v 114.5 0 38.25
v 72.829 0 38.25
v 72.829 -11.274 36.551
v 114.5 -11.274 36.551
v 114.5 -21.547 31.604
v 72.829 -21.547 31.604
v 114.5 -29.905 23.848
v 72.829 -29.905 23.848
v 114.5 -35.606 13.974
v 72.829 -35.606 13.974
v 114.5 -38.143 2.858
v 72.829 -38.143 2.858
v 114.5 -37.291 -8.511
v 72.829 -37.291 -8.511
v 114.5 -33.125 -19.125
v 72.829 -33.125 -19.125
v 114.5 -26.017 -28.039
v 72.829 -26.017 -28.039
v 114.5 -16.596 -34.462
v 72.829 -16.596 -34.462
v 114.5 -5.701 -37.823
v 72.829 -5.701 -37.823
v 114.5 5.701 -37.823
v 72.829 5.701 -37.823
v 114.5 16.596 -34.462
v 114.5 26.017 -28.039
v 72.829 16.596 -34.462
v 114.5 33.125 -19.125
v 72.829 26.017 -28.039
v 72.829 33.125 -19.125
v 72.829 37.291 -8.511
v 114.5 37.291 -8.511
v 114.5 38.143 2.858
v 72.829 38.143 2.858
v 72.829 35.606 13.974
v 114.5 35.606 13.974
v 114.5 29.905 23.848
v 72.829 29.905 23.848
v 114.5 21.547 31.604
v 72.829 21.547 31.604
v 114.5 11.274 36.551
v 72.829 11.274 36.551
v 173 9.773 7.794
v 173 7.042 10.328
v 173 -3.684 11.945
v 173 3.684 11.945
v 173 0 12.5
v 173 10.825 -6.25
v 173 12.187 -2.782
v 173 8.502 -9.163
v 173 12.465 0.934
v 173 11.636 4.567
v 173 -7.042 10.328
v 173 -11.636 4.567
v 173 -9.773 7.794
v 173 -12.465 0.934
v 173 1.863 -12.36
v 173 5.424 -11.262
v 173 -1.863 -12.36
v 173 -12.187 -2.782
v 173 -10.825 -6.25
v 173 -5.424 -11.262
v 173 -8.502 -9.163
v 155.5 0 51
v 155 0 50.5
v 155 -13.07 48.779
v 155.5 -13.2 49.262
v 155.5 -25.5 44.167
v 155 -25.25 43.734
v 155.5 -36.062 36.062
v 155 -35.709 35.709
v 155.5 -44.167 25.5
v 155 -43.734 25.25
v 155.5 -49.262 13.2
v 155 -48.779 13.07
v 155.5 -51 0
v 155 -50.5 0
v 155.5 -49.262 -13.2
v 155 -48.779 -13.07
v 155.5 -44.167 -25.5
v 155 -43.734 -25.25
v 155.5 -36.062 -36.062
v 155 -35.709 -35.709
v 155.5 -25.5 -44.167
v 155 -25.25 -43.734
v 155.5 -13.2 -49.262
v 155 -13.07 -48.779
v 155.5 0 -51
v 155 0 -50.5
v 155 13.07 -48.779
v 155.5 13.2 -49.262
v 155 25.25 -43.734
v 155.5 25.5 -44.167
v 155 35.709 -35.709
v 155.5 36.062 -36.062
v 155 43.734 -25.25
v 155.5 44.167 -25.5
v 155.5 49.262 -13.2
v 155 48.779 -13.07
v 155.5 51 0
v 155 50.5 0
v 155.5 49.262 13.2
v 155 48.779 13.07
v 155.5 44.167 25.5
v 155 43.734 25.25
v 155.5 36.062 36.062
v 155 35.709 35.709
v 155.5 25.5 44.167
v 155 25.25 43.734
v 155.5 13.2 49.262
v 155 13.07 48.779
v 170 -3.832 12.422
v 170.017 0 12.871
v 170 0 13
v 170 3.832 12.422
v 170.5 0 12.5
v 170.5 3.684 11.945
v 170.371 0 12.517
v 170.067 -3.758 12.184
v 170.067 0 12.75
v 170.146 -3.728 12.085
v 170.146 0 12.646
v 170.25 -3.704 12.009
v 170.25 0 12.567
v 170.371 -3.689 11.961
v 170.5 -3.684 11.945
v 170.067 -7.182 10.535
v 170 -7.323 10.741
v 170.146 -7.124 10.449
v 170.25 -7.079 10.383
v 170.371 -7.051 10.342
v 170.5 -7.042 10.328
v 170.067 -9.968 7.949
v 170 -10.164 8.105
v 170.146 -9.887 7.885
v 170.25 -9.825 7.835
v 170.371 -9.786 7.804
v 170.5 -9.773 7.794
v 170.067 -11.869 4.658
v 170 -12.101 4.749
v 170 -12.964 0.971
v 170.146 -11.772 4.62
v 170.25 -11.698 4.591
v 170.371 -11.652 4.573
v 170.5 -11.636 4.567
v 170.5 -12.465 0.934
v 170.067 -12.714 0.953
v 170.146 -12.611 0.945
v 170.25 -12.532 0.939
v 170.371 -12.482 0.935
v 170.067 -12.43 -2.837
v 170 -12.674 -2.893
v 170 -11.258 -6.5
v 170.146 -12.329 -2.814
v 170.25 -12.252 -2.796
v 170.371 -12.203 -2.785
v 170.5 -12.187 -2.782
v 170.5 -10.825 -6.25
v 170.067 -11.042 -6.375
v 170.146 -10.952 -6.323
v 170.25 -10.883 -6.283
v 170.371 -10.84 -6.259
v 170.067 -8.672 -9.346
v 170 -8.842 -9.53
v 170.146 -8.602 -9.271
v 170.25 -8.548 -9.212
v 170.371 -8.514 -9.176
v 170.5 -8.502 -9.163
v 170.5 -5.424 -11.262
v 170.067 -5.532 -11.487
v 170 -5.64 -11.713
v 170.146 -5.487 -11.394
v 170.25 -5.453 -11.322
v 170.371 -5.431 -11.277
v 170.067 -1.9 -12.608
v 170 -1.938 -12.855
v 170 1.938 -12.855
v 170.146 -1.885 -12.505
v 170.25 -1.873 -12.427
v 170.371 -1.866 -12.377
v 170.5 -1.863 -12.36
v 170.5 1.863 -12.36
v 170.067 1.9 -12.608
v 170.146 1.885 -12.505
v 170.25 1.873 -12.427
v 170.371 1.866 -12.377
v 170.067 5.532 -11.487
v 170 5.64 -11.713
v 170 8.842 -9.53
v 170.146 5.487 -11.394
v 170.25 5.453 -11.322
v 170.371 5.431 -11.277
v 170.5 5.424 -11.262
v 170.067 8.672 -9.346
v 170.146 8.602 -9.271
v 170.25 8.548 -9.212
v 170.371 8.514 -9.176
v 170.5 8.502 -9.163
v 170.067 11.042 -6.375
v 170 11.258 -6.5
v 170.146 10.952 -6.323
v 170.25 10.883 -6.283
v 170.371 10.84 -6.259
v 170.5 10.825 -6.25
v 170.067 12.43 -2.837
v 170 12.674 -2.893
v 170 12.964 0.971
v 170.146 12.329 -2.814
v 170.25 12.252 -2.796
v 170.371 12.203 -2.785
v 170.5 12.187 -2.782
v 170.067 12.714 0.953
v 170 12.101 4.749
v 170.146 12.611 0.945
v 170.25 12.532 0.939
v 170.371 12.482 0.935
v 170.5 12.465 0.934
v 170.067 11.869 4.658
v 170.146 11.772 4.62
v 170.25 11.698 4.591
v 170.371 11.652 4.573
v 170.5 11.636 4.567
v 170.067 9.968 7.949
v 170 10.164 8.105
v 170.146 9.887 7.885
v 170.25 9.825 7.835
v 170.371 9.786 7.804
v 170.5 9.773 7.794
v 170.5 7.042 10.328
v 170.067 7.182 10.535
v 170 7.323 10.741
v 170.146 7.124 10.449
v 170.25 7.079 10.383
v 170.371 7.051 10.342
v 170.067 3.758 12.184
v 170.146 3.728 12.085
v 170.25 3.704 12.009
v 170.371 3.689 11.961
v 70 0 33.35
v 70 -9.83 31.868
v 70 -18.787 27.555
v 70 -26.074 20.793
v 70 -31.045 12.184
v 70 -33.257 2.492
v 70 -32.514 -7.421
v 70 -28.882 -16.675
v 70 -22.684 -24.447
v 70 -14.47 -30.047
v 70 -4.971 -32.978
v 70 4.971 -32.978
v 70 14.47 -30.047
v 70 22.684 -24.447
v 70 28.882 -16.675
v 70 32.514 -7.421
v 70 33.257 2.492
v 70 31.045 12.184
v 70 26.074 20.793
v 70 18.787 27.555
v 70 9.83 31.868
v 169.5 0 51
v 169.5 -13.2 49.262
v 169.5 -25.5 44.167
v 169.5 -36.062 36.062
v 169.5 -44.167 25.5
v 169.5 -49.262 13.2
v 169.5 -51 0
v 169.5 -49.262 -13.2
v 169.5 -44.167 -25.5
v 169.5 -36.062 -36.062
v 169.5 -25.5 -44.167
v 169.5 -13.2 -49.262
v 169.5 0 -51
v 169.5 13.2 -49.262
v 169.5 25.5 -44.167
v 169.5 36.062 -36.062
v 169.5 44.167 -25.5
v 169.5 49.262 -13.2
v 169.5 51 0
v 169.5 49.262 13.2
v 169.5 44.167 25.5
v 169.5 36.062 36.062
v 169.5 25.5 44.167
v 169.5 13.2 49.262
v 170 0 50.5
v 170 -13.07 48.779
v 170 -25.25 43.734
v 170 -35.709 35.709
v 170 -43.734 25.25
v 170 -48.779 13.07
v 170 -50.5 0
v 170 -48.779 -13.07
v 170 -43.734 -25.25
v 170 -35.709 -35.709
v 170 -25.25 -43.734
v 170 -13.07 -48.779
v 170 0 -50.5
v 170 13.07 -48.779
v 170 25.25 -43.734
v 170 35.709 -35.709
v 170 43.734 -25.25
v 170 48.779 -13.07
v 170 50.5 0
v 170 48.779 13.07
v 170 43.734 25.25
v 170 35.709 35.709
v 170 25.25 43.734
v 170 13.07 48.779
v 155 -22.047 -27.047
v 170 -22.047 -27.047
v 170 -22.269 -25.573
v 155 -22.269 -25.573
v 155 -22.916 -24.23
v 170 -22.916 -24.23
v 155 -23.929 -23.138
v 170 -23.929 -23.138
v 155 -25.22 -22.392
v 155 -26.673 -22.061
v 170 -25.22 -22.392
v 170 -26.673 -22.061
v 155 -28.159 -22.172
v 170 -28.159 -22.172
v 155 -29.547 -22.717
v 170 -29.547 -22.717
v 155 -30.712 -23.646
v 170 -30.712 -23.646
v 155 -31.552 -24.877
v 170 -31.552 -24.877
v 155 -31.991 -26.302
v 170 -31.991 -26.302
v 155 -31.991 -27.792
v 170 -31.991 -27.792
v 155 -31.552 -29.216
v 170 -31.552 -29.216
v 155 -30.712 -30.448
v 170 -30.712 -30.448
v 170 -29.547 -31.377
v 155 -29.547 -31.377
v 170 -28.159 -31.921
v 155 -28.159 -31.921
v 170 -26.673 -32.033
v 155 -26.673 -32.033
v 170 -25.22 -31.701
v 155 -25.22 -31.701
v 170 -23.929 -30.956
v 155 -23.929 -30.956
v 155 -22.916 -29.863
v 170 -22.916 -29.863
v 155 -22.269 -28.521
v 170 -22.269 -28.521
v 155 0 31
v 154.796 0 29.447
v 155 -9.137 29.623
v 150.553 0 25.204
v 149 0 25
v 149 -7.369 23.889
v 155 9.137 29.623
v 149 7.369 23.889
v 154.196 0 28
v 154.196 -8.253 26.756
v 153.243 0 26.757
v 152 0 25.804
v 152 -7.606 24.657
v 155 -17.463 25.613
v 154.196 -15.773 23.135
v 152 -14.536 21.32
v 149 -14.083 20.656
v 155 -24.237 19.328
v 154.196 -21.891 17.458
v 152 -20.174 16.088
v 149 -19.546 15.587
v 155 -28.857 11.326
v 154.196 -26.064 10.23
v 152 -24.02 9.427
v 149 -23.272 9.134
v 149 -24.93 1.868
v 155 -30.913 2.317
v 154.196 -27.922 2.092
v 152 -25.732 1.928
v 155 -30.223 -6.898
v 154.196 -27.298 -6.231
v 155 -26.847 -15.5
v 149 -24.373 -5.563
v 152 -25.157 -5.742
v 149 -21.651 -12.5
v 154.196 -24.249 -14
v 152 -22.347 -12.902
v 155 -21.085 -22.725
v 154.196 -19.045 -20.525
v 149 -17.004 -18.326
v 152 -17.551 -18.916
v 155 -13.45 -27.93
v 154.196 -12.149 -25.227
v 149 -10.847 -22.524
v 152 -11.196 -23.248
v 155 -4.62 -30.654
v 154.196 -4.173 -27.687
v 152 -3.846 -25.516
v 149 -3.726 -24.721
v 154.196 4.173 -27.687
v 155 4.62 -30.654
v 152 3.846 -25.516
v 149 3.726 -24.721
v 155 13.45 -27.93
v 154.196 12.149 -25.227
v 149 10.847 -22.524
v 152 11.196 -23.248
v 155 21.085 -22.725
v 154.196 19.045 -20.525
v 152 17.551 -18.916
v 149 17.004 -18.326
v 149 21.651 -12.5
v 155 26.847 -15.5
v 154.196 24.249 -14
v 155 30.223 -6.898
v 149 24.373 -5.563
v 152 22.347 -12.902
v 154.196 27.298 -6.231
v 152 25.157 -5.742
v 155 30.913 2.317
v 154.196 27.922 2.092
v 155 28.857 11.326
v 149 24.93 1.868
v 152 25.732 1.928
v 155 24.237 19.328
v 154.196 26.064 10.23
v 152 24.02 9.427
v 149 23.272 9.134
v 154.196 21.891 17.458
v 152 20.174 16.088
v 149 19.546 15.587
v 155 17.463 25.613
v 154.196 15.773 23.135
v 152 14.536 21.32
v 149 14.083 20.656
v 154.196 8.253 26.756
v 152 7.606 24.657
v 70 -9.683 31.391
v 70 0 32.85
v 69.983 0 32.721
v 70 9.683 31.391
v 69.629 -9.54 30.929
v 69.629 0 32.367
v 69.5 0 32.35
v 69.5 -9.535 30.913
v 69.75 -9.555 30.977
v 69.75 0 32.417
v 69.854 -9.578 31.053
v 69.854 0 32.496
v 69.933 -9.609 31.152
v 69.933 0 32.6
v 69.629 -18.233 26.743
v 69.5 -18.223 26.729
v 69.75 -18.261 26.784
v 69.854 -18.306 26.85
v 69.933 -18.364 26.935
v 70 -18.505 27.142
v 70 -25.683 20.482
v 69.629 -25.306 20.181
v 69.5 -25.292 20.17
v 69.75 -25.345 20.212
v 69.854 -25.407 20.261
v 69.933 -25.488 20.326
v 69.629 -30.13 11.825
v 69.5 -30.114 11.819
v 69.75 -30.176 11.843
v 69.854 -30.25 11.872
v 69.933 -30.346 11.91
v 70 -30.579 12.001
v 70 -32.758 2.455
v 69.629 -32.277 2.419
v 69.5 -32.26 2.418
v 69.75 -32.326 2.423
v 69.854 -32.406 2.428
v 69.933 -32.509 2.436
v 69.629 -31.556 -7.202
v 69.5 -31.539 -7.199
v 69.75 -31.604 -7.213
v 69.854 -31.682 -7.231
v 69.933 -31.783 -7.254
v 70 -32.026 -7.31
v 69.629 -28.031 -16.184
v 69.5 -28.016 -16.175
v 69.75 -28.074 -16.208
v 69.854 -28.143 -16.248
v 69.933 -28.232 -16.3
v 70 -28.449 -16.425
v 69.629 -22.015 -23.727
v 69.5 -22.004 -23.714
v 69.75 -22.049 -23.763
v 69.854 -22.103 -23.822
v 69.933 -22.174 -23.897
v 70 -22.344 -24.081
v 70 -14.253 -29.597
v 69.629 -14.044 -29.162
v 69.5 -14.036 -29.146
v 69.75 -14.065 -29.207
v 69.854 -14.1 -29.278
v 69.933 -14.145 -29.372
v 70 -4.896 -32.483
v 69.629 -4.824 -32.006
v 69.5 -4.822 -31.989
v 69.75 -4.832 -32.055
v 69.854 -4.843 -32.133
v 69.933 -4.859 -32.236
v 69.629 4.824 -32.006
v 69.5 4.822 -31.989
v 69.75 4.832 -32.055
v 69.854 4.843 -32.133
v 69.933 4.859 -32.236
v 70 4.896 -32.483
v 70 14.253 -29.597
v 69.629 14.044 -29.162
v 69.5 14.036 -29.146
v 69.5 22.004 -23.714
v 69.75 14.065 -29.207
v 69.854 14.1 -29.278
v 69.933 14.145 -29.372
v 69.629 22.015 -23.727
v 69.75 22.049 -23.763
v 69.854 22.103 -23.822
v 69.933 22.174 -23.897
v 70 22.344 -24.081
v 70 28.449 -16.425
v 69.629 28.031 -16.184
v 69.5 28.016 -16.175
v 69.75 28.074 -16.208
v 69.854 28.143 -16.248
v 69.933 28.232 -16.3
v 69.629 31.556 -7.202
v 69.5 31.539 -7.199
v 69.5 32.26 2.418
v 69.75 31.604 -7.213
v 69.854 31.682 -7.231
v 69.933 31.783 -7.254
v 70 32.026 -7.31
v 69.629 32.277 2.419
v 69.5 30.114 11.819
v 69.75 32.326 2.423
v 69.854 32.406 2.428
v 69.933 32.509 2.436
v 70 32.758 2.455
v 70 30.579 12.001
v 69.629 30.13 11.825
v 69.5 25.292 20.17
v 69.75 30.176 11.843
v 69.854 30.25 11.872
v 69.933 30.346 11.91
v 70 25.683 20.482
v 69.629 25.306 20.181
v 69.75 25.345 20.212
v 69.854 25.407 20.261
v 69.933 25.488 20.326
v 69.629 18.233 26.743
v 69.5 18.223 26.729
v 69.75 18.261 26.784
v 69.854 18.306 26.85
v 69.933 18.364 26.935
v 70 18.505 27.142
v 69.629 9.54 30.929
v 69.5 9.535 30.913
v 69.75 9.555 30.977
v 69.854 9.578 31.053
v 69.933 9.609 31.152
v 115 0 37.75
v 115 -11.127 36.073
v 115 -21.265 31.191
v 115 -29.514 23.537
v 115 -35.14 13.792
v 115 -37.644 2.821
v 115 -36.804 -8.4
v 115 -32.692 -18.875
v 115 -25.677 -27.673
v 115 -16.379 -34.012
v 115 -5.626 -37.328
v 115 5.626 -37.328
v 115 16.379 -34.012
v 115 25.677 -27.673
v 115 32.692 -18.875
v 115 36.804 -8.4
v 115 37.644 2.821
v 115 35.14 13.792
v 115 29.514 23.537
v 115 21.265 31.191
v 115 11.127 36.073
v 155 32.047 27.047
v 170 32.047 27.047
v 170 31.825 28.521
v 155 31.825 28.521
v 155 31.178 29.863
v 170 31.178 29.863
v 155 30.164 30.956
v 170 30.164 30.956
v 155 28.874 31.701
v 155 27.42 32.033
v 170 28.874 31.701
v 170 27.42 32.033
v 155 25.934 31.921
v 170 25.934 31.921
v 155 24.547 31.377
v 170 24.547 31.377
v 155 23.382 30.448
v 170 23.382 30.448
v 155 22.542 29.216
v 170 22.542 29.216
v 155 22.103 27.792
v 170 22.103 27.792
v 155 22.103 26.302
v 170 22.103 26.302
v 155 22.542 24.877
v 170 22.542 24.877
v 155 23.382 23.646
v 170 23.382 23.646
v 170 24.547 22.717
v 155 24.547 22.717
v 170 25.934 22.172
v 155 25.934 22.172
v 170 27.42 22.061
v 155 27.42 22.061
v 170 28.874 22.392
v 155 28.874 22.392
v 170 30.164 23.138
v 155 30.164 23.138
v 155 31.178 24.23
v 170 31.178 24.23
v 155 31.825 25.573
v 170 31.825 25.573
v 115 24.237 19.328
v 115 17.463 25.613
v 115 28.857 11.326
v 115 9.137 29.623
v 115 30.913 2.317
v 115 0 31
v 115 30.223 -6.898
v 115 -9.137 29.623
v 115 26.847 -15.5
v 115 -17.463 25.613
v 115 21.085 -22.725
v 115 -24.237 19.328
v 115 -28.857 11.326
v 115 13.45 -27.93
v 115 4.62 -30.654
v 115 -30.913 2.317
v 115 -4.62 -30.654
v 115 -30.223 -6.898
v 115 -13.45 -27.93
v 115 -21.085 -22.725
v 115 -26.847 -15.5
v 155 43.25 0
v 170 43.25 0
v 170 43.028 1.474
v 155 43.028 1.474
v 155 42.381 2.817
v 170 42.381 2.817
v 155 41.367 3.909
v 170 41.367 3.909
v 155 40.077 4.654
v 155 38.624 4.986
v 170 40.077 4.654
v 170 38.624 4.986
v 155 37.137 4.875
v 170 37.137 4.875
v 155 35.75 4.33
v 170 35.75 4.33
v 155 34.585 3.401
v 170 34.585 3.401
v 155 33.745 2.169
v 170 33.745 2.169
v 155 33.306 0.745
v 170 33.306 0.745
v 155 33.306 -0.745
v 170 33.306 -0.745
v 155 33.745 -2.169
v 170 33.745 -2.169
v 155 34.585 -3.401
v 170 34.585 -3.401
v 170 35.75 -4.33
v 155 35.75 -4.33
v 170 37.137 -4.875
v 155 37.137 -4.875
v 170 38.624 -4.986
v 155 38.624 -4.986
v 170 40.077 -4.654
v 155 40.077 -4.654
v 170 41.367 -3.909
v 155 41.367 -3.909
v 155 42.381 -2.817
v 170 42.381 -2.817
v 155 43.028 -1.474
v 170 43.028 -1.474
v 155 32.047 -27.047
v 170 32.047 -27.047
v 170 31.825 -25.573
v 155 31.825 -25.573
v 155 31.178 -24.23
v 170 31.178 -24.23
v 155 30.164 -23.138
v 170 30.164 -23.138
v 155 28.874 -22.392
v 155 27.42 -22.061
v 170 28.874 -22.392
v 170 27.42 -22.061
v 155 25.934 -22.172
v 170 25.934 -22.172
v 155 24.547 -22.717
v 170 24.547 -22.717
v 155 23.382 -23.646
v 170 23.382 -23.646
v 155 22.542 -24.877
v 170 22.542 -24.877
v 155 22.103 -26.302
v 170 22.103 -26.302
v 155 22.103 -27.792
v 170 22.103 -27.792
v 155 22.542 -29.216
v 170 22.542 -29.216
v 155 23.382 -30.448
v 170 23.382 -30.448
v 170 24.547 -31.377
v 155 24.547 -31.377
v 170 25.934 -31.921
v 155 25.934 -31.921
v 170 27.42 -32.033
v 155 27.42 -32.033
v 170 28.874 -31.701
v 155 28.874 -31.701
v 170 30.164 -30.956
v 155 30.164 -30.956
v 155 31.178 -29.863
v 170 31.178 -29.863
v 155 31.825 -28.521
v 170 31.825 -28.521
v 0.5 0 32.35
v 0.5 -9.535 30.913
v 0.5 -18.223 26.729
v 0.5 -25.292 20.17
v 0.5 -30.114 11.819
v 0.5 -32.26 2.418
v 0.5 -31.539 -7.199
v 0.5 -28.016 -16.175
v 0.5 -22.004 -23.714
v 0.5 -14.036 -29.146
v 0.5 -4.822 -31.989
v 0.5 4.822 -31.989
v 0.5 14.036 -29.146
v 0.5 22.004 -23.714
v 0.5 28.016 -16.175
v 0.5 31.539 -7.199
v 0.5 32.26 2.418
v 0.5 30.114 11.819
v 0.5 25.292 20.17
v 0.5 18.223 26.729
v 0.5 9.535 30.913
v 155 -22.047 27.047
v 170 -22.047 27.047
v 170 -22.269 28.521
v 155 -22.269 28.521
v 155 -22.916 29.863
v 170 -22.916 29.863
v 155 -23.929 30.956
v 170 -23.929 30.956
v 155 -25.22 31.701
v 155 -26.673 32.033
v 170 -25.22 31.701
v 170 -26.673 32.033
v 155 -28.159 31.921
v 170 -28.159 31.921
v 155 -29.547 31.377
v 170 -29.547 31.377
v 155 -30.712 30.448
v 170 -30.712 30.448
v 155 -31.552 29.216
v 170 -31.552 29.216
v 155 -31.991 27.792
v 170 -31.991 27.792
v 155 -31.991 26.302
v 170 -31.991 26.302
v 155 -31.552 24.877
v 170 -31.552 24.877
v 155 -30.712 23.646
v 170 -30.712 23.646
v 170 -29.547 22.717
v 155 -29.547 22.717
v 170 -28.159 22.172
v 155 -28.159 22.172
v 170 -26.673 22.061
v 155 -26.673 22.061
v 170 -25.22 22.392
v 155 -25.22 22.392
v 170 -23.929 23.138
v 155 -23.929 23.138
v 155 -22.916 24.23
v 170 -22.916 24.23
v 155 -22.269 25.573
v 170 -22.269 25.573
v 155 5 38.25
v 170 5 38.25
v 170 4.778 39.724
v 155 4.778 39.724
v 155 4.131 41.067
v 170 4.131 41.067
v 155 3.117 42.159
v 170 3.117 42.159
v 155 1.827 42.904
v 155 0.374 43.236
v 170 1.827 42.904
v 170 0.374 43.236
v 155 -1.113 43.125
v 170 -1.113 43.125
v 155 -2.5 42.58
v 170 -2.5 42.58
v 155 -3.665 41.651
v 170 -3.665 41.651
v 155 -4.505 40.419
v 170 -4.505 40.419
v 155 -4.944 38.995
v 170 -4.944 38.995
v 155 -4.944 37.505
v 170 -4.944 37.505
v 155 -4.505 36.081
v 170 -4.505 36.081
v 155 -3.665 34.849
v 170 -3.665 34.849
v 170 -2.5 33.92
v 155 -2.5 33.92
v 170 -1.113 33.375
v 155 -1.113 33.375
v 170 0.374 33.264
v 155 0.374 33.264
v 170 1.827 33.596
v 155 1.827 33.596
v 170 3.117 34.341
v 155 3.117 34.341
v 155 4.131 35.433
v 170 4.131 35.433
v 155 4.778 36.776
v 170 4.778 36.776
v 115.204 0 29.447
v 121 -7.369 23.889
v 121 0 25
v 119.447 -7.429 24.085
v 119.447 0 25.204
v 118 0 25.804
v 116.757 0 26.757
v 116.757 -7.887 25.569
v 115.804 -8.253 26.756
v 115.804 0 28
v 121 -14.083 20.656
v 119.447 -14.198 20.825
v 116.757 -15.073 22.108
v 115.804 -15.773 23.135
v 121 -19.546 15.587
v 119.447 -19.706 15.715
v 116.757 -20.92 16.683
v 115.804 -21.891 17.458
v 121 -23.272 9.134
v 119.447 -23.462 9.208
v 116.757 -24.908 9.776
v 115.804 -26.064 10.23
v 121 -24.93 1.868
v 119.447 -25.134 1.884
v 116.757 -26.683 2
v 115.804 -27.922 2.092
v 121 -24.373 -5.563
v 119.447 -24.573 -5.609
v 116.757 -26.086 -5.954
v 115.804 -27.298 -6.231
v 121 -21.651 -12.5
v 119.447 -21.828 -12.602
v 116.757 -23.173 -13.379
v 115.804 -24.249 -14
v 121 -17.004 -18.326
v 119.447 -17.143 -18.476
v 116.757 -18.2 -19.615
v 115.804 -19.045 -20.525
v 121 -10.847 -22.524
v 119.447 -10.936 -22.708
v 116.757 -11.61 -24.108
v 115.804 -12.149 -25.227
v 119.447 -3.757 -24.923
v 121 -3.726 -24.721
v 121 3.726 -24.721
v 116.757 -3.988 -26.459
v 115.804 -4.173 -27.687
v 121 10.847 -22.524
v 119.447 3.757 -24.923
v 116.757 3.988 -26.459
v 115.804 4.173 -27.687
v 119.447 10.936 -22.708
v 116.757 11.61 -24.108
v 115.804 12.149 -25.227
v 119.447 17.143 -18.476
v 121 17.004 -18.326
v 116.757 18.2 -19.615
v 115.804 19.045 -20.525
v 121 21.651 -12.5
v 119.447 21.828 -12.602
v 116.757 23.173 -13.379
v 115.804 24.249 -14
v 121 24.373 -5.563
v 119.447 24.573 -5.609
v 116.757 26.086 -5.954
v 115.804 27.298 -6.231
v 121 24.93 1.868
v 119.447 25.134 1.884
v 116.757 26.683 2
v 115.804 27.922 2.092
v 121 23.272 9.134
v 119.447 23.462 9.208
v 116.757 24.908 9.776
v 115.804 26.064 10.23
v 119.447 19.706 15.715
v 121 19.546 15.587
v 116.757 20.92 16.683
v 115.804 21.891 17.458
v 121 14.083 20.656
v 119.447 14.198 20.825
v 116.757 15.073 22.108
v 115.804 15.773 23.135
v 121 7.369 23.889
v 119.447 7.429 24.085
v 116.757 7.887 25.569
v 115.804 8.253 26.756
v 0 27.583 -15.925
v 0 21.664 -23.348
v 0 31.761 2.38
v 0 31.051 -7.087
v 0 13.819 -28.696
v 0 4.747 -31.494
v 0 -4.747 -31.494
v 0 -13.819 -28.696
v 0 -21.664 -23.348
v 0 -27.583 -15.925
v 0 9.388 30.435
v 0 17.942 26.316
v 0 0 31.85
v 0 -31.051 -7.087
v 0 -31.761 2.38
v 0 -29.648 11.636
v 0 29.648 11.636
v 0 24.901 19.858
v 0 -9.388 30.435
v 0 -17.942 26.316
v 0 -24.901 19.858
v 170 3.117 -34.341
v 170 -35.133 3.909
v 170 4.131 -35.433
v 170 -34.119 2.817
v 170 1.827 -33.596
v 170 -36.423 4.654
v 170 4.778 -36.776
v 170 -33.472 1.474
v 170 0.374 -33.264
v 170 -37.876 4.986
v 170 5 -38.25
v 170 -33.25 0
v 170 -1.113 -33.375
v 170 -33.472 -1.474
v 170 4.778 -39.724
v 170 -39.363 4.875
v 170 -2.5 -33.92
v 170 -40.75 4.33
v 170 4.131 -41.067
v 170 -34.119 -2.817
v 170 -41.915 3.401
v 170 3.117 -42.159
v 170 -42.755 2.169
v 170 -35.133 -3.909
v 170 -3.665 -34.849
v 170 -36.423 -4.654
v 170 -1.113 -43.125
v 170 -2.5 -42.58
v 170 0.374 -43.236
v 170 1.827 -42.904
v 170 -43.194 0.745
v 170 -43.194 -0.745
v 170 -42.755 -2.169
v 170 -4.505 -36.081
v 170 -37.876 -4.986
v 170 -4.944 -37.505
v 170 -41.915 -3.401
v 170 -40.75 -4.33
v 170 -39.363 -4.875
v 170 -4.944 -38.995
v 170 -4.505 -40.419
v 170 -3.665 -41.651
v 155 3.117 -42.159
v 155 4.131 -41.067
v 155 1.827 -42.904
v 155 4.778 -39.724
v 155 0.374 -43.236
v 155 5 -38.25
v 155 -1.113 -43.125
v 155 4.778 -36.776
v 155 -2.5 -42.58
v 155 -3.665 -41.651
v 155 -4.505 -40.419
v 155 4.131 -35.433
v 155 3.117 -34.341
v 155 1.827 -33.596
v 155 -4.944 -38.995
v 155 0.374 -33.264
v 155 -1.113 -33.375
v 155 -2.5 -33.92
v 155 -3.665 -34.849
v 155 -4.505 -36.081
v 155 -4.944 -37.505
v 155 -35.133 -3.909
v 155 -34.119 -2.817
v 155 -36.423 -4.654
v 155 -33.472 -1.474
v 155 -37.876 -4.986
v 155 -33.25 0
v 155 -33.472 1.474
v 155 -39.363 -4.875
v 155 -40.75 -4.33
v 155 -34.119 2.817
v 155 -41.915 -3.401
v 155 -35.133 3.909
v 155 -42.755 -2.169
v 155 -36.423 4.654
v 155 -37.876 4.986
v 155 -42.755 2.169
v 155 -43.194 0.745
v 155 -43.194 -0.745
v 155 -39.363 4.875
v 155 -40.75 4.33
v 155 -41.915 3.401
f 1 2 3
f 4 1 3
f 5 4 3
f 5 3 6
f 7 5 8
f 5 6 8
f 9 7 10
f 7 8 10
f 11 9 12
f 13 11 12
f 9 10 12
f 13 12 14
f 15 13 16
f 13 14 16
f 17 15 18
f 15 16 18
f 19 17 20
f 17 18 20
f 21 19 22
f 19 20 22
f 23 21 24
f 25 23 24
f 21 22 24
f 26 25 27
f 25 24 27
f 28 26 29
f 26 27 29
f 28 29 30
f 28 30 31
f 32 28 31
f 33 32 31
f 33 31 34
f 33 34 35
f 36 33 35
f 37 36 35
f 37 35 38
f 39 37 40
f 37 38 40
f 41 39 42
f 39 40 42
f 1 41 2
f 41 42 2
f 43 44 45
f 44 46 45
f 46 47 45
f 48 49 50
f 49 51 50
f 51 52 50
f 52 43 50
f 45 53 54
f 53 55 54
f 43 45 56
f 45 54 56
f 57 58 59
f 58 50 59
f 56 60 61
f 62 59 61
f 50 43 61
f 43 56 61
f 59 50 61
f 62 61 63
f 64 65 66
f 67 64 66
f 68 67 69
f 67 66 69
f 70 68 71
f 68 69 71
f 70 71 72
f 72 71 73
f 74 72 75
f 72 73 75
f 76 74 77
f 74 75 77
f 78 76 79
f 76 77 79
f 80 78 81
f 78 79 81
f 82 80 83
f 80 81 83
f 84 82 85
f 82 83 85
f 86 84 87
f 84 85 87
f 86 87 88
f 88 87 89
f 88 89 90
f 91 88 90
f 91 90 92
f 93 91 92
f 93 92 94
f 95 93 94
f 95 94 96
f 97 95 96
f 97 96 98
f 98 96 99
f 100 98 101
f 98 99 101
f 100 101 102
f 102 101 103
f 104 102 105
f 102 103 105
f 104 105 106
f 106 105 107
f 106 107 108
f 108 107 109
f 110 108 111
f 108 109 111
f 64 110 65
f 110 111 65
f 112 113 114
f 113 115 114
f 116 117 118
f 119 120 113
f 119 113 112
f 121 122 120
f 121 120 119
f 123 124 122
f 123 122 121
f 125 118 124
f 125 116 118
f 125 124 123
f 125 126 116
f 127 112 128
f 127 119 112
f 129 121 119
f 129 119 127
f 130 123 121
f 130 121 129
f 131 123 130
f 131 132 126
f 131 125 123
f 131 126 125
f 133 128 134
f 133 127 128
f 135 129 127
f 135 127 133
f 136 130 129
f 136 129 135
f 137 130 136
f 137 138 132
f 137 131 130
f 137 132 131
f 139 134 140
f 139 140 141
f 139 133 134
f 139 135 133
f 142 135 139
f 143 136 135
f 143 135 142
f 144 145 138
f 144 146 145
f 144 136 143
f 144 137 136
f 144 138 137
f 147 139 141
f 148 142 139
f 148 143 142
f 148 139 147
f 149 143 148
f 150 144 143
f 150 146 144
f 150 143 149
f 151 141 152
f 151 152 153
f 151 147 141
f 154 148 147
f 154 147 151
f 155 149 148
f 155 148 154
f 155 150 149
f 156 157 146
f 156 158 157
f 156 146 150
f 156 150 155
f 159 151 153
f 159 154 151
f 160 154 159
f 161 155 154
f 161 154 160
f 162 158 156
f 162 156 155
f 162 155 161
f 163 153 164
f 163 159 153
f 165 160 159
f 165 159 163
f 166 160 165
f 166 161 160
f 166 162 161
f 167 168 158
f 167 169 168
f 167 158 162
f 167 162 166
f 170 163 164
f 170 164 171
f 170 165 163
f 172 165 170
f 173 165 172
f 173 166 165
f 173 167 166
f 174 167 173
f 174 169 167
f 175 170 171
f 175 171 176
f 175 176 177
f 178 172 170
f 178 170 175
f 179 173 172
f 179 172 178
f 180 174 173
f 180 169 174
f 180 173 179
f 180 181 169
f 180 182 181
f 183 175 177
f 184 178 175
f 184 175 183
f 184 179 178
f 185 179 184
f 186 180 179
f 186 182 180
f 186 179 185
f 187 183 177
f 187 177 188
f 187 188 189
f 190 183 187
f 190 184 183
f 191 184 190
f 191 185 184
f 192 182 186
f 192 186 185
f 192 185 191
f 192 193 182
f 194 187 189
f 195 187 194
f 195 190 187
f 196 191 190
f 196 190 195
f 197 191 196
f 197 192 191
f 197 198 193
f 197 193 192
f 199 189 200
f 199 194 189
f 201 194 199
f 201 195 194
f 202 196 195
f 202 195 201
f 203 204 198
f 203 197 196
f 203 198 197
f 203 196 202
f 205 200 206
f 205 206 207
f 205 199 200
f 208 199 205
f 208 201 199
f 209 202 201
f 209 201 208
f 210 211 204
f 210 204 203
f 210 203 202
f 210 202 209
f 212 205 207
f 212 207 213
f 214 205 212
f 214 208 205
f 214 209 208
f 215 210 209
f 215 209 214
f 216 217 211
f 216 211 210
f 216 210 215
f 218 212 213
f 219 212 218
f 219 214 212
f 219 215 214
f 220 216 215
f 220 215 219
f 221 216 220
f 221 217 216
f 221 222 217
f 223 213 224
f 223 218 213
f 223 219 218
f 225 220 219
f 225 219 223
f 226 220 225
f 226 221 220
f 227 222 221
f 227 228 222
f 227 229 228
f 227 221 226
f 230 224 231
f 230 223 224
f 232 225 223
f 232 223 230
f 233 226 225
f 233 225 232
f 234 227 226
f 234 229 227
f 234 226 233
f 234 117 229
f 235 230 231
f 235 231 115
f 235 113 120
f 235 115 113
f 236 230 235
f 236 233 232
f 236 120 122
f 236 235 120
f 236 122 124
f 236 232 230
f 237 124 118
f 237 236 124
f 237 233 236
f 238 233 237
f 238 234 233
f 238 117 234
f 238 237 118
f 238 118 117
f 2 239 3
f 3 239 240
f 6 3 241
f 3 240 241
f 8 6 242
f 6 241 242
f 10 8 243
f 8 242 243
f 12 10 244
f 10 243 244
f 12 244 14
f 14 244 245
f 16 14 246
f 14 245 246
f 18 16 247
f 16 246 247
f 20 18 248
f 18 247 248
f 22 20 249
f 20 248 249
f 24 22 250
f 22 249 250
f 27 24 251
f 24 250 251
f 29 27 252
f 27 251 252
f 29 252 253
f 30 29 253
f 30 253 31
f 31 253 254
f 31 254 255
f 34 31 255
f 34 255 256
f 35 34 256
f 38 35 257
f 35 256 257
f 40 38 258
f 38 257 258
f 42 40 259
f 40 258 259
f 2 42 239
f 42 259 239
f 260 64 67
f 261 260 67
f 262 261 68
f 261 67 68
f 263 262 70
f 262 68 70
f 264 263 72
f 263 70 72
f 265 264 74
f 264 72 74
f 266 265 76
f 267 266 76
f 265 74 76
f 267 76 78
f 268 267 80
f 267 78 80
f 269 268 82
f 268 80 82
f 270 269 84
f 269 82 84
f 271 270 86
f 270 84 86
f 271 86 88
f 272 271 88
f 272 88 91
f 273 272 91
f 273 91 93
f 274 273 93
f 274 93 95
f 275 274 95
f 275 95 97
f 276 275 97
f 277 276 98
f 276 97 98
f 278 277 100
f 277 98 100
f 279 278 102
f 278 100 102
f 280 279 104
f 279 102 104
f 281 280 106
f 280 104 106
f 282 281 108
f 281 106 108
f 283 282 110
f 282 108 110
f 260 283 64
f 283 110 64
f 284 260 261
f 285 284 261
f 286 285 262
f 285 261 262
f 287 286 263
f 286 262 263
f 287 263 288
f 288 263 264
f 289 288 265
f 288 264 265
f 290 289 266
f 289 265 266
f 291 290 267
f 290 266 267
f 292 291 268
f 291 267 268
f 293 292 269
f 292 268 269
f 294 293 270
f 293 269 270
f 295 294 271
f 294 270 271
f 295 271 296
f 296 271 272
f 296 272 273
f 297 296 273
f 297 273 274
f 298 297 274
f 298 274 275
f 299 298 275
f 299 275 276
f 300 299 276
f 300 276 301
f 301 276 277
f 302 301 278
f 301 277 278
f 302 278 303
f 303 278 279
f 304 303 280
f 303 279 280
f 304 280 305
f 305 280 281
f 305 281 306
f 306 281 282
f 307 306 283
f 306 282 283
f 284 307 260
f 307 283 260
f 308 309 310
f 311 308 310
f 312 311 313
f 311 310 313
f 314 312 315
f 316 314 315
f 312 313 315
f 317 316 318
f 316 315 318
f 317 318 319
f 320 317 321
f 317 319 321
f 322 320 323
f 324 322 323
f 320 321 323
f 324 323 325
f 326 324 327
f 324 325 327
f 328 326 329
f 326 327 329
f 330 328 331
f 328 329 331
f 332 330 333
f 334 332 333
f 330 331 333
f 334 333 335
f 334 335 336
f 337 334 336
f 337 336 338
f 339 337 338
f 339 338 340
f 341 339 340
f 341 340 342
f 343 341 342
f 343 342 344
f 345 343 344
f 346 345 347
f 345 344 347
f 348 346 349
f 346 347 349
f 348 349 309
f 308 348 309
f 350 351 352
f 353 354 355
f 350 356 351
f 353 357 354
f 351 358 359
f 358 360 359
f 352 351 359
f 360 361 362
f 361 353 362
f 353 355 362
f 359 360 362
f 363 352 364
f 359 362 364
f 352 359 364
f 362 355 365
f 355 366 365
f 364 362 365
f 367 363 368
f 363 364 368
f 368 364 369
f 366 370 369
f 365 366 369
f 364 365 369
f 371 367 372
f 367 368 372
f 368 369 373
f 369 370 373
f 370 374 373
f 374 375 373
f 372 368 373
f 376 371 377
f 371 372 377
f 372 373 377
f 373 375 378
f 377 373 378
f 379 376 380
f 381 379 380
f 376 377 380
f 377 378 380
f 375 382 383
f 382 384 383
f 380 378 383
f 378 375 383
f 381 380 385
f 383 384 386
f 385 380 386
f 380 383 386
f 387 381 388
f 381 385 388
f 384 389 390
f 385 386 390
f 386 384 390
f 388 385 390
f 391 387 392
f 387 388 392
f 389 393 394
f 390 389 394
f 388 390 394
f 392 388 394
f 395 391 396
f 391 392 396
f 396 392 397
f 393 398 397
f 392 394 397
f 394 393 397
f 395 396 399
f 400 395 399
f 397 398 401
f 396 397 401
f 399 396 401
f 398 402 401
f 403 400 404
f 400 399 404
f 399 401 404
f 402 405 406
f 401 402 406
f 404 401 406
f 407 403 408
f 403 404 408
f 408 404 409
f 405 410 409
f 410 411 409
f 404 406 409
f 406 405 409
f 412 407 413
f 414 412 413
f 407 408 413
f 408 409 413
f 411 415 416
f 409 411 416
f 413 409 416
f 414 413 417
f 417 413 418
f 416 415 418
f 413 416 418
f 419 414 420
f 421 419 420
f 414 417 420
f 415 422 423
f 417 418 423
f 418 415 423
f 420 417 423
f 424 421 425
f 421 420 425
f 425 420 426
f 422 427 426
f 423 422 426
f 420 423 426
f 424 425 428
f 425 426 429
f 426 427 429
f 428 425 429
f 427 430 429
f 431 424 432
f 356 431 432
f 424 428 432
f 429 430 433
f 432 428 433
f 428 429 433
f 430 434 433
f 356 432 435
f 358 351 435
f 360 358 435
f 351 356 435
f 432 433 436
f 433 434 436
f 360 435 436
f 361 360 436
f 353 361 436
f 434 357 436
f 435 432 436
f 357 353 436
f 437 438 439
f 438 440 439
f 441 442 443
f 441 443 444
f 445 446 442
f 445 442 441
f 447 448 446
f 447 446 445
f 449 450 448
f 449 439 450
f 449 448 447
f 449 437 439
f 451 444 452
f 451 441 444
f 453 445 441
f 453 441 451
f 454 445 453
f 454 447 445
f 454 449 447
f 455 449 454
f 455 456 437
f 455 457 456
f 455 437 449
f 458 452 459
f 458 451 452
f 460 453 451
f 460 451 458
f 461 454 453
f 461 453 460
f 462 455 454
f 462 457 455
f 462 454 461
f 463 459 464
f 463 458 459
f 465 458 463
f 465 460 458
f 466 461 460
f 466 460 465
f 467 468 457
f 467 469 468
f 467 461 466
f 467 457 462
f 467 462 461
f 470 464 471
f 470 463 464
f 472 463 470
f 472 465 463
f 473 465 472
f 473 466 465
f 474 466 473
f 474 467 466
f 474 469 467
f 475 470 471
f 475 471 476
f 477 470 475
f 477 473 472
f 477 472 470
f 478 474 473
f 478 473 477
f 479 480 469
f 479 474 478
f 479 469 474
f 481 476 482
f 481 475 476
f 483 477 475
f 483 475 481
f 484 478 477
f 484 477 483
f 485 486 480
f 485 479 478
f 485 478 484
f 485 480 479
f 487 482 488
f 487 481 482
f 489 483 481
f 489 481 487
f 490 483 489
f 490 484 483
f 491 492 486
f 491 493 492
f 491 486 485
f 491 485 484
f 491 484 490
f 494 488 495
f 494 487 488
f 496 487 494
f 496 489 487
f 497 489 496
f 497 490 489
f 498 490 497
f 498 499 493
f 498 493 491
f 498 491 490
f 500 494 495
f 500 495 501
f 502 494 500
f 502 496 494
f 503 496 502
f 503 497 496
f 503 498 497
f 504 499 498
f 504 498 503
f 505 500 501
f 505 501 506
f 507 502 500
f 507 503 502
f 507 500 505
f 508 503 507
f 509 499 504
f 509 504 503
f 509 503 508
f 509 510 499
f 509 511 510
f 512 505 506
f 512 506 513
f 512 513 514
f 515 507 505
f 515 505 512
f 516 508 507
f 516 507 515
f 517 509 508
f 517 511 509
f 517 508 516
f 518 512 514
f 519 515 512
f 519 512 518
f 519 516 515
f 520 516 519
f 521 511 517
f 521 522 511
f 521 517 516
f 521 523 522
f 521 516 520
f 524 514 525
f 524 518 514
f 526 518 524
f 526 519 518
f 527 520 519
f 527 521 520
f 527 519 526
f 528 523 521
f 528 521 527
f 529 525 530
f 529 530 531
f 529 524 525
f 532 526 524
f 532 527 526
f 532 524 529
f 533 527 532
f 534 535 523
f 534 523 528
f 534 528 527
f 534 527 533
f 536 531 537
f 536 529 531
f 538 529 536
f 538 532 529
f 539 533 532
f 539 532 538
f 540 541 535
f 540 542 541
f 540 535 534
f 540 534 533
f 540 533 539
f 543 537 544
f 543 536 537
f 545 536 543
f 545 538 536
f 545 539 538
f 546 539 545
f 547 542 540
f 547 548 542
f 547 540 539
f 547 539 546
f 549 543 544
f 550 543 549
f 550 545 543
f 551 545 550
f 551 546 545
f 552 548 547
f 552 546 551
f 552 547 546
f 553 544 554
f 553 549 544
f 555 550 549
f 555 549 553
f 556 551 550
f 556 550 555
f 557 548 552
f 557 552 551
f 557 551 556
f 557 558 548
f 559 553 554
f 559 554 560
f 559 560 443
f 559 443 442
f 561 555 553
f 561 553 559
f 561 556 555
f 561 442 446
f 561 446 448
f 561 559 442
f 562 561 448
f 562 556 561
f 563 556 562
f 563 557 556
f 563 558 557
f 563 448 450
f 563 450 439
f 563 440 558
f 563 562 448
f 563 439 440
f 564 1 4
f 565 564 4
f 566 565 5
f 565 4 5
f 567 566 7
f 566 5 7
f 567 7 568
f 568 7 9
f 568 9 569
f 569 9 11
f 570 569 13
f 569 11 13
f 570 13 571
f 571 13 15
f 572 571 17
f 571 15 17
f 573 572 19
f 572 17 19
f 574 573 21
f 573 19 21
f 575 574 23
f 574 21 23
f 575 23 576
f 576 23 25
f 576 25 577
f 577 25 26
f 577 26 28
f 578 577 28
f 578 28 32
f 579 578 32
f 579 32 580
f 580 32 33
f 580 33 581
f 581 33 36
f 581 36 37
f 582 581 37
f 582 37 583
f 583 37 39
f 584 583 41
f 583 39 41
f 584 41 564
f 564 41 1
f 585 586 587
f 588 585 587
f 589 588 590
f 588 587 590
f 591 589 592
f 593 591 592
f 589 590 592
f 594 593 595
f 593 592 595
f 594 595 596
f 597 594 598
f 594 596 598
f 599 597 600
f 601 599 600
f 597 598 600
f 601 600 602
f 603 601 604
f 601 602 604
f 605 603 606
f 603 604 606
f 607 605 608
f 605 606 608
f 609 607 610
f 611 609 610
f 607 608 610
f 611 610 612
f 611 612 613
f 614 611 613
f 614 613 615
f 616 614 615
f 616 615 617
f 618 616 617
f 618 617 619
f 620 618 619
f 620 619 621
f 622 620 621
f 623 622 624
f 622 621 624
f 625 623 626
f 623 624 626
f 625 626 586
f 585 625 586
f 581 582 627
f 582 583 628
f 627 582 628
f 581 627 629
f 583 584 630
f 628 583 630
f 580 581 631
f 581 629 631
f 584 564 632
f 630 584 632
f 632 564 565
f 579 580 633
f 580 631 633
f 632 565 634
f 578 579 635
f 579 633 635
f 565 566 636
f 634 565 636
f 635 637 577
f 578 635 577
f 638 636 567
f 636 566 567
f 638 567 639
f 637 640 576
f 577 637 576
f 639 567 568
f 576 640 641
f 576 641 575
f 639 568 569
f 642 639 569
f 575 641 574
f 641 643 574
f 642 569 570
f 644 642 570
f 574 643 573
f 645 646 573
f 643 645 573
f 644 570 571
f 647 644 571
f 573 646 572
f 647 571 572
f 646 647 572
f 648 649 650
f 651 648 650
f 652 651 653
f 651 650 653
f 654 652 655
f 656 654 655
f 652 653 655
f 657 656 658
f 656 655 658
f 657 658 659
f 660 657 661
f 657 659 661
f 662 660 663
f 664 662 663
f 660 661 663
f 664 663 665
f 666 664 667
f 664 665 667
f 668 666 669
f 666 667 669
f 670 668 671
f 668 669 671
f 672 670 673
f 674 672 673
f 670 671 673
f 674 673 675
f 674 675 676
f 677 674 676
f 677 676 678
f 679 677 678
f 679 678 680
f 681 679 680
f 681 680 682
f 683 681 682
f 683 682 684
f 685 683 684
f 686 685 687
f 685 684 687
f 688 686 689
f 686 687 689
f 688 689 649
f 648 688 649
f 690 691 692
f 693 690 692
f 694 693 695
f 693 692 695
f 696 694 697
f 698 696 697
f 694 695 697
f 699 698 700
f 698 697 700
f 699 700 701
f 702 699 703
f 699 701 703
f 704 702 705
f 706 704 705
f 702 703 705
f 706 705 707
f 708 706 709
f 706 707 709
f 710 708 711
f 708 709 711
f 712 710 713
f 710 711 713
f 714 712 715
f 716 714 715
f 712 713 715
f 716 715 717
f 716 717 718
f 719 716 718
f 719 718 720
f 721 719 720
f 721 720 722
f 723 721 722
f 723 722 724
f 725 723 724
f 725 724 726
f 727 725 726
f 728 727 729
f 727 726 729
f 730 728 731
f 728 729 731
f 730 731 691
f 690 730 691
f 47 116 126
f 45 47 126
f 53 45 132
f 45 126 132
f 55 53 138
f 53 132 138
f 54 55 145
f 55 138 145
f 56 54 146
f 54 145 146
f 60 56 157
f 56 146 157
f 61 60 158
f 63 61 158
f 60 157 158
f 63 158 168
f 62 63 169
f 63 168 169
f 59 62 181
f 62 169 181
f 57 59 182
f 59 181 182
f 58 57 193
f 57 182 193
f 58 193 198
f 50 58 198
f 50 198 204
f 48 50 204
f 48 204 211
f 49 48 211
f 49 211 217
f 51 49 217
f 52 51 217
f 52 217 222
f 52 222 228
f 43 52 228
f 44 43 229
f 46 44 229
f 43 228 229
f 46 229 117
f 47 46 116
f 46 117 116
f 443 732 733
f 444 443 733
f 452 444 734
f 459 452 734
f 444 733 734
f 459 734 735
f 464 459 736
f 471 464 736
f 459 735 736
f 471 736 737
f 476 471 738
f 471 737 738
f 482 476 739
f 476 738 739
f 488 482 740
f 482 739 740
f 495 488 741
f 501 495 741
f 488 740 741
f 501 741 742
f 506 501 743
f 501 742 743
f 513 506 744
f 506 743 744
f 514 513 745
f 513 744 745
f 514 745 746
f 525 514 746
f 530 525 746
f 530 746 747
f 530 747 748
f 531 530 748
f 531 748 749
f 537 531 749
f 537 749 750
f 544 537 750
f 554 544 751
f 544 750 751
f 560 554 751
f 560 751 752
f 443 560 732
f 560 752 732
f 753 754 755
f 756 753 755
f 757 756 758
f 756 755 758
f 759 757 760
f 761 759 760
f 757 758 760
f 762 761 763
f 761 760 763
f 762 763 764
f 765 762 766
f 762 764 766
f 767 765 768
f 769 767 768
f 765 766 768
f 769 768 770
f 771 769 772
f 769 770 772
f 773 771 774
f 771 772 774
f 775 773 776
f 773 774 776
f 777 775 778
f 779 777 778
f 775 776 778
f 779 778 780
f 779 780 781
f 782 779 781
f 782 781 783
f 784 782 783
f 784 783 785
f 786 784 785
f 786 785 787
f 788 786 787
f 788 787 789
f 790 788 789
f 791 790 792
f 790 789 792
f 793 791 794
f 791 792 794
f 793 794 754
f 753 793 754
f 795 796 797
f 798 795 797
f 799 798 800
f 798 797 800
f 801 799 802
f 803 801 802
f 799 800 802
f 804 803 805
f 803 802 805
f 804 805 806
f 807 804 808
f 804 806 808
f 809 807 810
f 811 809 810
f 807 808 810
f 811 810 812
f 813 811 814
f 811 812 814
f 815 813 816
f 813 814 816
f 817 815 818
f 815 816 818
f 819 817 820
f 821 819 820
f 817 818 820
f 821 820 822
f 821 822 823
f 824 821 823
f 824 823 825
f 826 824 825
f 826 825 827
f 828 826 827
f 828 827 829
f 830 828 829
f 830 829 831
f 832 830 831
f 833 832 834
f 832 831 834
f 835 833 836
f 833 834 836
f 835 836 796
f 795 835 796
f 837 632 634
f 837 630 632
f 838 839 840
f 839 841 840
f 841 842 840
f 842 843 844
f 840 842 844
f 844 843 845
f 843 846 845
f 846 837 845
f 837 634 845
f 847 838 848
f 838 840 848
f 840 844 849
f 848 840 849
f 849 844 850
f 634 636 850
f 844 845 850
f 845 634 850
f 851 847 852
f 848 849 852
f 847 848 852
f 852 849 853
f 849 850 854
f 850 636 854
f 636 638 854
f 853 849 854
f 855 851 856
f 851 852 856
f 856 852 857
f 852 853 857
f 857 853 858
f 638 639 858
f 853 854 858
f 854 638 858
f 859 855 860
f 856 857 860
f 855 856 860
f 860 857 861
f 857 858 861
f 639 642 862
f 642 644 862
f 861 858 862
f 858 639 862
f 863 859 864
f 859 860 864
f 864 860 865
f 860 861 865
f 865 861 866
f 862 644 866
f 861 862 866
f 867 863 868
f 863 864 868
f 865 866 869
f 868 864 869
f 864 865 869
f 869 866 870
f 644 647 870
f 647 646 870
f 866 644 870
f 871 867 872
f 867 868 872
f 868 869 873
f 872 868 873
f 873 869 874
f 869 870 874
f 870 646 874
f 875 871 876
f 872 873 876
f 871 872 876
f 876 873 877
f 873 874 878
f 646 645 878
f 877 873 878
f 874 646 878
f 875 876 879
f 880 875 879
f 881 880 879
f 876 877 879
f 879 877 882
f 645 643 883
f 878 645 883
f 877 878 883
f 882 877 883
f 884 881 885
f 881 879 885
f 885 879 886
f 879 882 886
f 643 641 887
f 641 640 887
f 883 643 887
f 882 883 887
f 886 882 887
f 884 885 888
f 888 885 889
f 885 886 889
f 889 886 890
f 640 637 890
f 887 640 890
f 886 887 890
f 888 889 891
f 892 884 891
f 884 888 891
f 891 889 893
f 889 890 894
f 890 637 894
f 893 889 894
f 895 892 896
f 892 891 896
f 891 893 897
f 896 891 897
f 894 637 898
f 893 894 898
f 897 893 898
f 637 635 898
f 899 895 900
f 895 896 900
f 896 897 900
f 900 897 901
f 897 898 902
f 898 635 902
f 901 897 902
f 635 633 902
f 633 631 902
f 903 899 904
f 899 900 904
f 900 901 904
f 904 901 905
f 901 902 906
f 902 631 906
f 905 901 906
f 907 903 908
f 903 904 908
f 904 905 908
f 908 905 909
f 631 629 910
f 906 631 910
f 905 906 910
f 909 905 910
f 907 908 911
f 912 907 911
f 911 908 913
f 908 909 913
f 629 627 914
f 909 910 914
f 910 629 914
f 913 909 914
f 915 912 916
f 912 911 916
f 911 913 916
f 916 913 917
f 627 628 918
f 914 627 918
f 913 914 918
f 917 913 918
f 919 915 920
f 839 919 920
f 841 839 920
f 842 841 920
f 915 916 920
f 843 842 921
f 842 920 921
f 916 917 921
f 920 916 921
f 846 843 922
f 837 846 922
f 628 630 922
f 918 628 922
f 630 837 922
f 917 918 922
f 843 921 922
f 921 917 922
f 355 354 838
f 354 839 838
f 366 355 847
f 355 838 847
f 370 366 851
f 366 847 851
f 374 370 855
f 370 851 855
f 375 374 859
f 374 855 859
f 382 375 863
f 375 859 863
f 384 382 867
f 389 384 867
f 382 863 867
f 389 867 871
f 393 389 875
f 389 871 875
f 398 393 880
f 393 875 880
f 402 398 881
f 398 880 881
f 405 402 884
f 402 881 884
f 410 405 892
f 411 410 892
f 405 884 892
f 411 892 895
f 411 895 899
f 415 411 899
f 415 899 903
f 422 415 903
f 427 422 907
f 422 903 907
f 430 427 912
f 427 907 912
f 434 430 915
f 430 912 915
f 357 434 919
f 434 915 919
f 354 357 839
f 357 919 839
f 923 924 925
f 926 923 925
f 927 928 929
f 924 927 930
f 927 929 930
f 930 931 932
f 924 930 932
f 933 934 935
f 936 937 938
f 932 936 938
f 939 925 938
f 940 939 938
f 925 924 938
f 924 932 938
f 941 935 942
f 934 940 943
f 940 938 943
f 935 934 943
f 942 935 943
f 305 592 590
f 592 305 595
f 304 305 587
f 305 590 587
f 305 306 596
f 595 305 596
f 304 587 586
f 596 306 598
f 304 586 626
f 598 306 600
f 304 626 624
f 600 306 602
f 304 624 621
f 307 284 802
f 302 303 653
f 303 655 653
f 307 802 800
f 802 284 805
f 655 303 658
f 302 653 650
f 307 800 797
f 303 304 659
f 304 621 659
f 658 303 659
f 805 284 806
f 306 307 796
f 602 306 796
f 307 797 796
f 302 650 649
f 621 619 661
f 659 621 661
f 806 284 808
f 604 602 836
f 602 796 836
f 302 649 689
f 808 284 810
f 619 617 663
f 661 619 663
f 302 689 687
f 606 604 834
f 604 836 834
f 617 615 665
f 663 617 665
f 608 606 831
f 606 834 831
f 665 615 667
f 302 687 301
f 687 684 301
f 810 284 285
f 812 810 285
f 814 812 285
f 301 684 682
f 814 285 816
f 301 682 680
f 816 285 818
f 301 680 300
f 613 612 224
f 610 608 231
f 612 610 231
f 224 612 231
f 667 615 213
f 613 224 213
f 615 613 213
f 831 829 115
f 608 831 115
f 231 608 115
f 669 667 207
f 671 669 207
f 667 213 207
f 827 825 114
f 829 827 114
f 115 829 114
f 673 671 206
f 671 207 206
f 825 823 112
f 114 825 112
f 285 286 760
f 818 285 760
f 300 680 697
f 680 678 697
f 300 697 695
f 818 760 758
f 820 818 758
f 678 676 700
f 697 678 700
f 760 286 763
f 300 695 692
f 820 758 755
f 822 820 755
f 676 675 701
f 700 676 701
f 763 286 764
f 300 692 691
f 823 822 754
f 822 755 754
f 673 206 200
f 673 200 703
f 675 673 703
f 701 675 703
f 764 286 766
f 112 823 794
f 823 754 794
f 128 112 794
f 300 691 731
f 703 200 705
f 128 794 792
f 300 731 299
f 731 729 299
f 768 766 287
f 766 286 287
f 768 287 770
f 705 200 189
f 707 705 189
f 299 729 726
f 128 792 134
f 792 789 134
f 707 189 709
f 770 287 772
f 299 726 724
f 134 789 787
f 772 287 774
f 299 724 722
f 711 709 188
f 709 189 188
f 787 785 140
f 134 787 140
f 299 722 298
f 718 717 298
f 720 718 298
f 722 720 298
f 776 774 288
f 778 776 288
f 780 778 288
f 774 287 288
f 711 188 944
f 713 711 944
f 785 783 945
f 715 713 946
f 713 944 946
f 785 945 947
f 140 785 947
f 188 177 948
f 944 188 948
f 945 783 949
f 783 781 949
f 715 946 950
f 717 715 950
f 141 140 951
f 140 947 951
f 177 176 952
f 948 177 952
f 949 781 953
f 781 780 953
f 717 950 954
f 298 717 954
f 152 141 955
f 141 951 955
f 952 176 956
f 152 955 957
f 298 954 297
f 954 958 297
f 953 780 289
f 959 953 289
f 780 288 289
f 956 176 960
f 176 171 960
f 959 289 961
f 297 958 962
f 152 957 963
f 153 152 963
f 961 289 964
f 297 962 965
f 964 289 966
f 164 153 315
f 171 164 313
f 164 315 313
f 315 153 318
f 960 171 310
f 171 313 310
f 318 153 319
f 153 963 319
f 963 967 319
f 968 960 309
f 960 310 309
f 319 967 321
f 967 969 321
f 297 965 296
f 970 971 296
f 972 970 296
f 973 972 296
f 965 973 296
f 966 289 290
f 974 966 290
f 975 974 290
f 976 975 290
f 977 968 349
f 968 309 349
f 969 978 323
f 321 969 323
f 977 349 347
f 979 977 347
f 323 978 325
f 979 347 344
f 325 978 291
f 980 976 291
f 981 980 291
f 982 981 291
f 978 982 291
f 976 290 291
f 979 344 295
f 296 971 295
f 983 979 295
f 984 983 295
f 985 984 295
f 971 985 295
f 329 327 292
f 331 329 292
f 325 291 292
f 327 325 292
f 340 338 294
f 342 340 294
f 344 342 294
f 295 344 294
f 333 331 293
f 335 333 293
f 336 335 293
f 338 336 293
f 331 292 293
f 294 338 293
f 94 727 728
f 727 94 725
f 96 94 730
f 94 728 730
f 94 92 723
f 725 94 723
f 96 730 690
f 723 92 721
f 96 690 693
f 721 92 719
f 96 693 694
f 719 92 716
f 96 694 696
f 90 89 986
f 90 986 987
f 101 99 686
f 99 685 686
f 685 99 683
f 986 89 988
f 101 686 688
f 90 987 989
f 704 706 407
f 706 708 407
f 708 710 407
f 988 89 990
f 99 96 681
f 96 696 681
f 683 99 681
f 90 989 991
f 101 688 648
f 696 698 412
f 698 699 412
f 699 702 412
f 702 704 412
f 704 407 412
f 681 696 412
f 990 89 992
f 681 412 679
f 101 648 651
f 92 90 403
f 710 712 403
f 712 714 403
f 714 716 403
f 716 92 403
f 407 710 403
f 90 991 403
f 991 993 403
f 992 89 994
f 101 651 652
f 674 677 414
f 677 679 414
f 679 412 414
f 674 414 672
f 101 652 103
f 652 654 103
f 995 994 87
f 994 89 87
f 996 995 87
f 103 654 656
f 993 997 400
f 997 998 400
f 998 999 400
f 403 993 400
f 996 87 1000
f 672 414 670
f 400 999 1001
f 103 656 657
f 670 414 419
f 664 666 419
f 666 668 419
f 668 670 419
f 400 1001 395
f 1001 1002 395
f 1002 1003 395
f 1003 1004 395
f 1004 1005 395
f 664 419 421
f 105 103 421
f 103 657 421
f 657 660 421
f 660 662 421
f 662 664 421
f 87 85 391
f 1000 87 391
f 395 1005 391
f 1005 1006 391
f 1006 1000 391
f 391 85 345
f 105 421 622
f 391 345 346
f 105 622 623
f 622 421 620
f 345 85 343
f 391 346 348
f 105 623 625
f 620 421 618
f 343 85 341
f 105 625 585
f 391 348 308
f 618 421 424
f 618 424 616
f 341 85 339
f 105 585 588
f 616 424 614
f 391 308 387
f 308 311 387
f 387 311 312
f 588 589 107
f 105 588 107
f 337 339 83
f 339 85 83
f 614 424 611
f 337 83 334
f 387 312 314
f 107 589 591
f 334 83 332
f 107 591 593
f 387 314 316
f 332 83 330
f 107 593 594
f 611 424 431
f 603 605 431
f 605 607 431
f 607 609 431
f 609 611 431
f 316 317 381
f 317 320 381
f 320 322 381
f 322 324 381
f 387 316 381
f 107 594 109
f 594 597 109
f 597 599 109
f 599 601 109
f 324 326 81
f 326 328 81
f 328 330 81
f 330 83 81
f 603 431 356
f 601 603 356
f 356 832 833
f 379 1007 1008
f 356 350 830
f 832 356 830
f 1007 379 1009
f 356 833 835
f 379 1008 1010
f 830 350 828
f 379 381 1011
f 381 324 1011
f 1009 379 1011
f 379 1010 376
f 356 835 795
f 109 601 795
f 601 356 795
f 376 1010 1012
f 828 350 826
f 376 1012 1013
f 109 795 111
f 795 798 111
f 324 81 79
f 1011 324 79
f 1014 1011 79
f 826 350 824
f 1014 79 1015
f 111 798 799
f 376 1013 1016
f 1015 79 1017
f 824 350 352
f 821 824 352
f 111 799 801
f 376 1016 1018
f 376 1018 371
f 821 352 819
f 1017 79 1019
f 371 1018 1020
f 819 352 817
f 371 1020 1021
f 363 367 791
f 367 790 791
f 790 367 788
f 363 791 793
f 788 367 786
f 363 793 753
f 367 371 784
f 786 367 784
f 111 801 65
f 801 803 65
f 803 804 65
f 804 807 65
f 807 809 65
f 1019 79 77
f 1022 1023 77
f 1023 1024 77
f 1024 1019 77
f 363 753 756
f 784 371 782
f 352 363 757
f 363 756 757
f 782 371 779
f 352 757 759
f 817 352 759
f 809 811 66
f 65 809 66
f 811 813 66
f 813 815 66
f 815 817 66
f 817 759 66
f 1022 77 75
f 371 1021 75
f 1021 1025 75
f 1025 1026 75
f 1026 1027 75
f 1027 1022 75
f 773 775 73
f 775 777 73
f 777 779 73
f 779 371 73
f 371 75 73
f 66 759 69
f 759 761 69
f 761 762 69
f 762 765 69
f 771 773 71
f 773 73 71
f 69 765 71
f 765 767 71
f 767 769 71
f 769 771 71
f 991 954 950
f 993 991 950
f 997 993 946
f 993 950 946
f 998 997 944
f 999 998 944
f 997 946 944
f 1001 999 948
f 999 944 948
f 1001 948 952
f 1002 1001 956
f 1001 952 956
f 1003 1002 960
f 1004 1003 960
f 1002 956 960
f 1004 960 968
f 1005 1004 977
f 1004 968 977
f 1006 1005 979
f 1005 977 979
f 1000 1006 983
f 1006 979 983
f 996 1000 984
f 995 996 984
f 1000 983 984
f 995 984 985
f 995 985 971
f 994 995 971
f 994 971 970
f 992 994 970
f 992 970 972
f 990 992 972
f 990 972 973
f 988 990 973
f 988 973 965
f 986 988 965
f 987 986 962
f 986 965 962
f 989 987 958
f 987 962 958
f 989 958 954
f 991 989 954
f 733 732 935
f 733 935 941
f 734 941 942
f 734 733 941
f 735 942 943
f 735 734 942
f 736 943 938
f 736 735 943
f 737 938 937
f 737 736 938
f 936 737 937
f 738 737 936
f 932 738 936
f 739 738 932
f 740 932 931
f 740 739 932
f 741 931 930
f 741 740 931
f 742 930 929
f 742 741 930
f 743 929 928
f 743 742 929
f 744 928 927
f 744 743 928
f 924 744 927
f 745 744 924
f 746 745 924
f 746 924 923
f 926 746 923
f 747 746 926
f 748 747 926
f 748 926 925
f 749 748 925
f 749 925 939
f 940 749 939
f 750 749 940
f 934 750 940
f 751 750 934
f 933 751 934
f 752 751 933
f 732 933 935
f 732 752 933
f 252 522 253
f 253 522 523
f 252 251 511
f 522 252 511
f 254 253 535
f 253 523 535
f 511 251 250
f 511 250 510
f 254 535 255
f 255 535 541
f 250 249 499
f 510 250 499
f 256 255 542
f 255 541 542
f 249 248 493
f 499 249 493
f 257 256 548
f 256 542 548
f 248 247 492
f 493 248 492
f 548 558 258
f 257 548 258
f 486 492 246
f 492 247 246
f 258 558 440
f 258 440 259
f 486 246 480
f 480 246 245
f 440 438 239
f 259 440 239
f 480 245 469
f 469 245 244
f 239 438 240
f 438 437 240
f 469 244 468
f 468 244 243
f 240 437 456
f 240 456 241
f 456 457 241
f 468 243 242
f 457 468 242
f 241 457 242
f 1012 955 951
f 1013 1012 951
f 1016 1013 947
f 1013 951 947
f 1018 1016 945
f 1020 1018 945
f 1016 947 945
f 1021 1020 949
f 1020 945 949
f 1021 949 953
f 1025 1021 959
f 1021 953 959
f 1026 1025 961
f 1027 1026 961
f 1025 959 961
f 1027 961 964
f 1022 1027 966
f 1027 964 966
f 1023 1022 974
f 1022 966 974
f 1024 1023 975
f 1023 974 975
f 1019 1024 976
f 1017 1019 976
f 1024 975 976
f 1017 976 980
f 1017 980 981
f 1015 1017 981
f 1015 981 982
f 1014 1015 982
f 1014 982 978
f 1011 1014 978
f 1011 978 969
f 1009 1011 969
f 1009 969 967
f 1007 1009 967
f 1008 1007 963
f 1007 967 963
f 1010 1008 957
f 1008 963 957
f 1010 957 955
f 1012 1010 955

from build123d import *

# Parameters (mm, degrees)
F2_SIZE  = 0.5
F3_R     = 0.5
F4_R     = 5
F5_DEPTH = 15


with BuildPart() as f1:
    # F0 (on Front) → F1 (revolve)
    with BuildSketch(Plane.XZ):
        with BuildLine():
            Line((0, 32.35), (0, 0))
            Line((0, 0), (173, 0))
            Line((173, 0), (173, 12.5))
            Line((173, 12.5), (170, 12.5))
            Line((170, 12.5), (170, 51))
            Line((170, 51), (155, 51))
            Line((155, 51), (155, 31))
            ThreePointArc((155, 31), (153.242641, 26.757359), (149, 25))
            Line((149, 25), (121, 25))
            ThreePointArc((121, 25), (116.757359, 26.757359), (115, 31))
            Line((115, 31), (115, 38.25))
            Line((115, 38.25), (72.829016, 38.25))
            Line((72.829016, 38.25), (70, 33.35))
            Line((70, 33.35), (70, 32.35))
            Line((70, 32.35), (0, 32.35))
        make_face()
    revolve(axis=Axis((86.5, 0, 0), (1, 0, 0)))

    # F2
    f2_edges = [f1.edges().sort_by_distance(p)[0] for p in [
        (0, 0, -32.35),
        (115, 0, -38.25),
        (155, 0, -51),
        (170, 0, -51),
    ]]
    chamfer(f2_edges, length=F2_SIZE)

    # F3
    f3_edges = [f1.edges().sort_by_distance(p)[0] for p in [
        (70, 0, -32.35),
        (170, 0, -12.5),
    ]]
    fillet(f3_edges, radius=F3_R)

    # F4 (on face) → F5 (cut, through all)
    with BuildSketch(Plane.YZ.offset(170)):
        with Locations((0, 38.25)):
            Circle(F4_R)
        with Locations((-27.046834, 27.046834)):
            Circle(F4_R)
        with Locations((-38.25, 0)):
            Circle(F4_R)
        with Locations((-27.046834, -27.046834)):
            Circle(F4_R)
        with Locations((0, -38.25)):
            Circle(F4_R)
        with Locations((27.046834, -27.046834)):
            Circle(F4_R)
        with Locations((38.25, 0)):
            Circle(F4_R)
        with Locations((27.046834, 27.046834)):
            Circle(F4_R)
    extrude(amount=-F5_DEPTH, mode=Mode.SUBTRACT)


solid = f1.part
